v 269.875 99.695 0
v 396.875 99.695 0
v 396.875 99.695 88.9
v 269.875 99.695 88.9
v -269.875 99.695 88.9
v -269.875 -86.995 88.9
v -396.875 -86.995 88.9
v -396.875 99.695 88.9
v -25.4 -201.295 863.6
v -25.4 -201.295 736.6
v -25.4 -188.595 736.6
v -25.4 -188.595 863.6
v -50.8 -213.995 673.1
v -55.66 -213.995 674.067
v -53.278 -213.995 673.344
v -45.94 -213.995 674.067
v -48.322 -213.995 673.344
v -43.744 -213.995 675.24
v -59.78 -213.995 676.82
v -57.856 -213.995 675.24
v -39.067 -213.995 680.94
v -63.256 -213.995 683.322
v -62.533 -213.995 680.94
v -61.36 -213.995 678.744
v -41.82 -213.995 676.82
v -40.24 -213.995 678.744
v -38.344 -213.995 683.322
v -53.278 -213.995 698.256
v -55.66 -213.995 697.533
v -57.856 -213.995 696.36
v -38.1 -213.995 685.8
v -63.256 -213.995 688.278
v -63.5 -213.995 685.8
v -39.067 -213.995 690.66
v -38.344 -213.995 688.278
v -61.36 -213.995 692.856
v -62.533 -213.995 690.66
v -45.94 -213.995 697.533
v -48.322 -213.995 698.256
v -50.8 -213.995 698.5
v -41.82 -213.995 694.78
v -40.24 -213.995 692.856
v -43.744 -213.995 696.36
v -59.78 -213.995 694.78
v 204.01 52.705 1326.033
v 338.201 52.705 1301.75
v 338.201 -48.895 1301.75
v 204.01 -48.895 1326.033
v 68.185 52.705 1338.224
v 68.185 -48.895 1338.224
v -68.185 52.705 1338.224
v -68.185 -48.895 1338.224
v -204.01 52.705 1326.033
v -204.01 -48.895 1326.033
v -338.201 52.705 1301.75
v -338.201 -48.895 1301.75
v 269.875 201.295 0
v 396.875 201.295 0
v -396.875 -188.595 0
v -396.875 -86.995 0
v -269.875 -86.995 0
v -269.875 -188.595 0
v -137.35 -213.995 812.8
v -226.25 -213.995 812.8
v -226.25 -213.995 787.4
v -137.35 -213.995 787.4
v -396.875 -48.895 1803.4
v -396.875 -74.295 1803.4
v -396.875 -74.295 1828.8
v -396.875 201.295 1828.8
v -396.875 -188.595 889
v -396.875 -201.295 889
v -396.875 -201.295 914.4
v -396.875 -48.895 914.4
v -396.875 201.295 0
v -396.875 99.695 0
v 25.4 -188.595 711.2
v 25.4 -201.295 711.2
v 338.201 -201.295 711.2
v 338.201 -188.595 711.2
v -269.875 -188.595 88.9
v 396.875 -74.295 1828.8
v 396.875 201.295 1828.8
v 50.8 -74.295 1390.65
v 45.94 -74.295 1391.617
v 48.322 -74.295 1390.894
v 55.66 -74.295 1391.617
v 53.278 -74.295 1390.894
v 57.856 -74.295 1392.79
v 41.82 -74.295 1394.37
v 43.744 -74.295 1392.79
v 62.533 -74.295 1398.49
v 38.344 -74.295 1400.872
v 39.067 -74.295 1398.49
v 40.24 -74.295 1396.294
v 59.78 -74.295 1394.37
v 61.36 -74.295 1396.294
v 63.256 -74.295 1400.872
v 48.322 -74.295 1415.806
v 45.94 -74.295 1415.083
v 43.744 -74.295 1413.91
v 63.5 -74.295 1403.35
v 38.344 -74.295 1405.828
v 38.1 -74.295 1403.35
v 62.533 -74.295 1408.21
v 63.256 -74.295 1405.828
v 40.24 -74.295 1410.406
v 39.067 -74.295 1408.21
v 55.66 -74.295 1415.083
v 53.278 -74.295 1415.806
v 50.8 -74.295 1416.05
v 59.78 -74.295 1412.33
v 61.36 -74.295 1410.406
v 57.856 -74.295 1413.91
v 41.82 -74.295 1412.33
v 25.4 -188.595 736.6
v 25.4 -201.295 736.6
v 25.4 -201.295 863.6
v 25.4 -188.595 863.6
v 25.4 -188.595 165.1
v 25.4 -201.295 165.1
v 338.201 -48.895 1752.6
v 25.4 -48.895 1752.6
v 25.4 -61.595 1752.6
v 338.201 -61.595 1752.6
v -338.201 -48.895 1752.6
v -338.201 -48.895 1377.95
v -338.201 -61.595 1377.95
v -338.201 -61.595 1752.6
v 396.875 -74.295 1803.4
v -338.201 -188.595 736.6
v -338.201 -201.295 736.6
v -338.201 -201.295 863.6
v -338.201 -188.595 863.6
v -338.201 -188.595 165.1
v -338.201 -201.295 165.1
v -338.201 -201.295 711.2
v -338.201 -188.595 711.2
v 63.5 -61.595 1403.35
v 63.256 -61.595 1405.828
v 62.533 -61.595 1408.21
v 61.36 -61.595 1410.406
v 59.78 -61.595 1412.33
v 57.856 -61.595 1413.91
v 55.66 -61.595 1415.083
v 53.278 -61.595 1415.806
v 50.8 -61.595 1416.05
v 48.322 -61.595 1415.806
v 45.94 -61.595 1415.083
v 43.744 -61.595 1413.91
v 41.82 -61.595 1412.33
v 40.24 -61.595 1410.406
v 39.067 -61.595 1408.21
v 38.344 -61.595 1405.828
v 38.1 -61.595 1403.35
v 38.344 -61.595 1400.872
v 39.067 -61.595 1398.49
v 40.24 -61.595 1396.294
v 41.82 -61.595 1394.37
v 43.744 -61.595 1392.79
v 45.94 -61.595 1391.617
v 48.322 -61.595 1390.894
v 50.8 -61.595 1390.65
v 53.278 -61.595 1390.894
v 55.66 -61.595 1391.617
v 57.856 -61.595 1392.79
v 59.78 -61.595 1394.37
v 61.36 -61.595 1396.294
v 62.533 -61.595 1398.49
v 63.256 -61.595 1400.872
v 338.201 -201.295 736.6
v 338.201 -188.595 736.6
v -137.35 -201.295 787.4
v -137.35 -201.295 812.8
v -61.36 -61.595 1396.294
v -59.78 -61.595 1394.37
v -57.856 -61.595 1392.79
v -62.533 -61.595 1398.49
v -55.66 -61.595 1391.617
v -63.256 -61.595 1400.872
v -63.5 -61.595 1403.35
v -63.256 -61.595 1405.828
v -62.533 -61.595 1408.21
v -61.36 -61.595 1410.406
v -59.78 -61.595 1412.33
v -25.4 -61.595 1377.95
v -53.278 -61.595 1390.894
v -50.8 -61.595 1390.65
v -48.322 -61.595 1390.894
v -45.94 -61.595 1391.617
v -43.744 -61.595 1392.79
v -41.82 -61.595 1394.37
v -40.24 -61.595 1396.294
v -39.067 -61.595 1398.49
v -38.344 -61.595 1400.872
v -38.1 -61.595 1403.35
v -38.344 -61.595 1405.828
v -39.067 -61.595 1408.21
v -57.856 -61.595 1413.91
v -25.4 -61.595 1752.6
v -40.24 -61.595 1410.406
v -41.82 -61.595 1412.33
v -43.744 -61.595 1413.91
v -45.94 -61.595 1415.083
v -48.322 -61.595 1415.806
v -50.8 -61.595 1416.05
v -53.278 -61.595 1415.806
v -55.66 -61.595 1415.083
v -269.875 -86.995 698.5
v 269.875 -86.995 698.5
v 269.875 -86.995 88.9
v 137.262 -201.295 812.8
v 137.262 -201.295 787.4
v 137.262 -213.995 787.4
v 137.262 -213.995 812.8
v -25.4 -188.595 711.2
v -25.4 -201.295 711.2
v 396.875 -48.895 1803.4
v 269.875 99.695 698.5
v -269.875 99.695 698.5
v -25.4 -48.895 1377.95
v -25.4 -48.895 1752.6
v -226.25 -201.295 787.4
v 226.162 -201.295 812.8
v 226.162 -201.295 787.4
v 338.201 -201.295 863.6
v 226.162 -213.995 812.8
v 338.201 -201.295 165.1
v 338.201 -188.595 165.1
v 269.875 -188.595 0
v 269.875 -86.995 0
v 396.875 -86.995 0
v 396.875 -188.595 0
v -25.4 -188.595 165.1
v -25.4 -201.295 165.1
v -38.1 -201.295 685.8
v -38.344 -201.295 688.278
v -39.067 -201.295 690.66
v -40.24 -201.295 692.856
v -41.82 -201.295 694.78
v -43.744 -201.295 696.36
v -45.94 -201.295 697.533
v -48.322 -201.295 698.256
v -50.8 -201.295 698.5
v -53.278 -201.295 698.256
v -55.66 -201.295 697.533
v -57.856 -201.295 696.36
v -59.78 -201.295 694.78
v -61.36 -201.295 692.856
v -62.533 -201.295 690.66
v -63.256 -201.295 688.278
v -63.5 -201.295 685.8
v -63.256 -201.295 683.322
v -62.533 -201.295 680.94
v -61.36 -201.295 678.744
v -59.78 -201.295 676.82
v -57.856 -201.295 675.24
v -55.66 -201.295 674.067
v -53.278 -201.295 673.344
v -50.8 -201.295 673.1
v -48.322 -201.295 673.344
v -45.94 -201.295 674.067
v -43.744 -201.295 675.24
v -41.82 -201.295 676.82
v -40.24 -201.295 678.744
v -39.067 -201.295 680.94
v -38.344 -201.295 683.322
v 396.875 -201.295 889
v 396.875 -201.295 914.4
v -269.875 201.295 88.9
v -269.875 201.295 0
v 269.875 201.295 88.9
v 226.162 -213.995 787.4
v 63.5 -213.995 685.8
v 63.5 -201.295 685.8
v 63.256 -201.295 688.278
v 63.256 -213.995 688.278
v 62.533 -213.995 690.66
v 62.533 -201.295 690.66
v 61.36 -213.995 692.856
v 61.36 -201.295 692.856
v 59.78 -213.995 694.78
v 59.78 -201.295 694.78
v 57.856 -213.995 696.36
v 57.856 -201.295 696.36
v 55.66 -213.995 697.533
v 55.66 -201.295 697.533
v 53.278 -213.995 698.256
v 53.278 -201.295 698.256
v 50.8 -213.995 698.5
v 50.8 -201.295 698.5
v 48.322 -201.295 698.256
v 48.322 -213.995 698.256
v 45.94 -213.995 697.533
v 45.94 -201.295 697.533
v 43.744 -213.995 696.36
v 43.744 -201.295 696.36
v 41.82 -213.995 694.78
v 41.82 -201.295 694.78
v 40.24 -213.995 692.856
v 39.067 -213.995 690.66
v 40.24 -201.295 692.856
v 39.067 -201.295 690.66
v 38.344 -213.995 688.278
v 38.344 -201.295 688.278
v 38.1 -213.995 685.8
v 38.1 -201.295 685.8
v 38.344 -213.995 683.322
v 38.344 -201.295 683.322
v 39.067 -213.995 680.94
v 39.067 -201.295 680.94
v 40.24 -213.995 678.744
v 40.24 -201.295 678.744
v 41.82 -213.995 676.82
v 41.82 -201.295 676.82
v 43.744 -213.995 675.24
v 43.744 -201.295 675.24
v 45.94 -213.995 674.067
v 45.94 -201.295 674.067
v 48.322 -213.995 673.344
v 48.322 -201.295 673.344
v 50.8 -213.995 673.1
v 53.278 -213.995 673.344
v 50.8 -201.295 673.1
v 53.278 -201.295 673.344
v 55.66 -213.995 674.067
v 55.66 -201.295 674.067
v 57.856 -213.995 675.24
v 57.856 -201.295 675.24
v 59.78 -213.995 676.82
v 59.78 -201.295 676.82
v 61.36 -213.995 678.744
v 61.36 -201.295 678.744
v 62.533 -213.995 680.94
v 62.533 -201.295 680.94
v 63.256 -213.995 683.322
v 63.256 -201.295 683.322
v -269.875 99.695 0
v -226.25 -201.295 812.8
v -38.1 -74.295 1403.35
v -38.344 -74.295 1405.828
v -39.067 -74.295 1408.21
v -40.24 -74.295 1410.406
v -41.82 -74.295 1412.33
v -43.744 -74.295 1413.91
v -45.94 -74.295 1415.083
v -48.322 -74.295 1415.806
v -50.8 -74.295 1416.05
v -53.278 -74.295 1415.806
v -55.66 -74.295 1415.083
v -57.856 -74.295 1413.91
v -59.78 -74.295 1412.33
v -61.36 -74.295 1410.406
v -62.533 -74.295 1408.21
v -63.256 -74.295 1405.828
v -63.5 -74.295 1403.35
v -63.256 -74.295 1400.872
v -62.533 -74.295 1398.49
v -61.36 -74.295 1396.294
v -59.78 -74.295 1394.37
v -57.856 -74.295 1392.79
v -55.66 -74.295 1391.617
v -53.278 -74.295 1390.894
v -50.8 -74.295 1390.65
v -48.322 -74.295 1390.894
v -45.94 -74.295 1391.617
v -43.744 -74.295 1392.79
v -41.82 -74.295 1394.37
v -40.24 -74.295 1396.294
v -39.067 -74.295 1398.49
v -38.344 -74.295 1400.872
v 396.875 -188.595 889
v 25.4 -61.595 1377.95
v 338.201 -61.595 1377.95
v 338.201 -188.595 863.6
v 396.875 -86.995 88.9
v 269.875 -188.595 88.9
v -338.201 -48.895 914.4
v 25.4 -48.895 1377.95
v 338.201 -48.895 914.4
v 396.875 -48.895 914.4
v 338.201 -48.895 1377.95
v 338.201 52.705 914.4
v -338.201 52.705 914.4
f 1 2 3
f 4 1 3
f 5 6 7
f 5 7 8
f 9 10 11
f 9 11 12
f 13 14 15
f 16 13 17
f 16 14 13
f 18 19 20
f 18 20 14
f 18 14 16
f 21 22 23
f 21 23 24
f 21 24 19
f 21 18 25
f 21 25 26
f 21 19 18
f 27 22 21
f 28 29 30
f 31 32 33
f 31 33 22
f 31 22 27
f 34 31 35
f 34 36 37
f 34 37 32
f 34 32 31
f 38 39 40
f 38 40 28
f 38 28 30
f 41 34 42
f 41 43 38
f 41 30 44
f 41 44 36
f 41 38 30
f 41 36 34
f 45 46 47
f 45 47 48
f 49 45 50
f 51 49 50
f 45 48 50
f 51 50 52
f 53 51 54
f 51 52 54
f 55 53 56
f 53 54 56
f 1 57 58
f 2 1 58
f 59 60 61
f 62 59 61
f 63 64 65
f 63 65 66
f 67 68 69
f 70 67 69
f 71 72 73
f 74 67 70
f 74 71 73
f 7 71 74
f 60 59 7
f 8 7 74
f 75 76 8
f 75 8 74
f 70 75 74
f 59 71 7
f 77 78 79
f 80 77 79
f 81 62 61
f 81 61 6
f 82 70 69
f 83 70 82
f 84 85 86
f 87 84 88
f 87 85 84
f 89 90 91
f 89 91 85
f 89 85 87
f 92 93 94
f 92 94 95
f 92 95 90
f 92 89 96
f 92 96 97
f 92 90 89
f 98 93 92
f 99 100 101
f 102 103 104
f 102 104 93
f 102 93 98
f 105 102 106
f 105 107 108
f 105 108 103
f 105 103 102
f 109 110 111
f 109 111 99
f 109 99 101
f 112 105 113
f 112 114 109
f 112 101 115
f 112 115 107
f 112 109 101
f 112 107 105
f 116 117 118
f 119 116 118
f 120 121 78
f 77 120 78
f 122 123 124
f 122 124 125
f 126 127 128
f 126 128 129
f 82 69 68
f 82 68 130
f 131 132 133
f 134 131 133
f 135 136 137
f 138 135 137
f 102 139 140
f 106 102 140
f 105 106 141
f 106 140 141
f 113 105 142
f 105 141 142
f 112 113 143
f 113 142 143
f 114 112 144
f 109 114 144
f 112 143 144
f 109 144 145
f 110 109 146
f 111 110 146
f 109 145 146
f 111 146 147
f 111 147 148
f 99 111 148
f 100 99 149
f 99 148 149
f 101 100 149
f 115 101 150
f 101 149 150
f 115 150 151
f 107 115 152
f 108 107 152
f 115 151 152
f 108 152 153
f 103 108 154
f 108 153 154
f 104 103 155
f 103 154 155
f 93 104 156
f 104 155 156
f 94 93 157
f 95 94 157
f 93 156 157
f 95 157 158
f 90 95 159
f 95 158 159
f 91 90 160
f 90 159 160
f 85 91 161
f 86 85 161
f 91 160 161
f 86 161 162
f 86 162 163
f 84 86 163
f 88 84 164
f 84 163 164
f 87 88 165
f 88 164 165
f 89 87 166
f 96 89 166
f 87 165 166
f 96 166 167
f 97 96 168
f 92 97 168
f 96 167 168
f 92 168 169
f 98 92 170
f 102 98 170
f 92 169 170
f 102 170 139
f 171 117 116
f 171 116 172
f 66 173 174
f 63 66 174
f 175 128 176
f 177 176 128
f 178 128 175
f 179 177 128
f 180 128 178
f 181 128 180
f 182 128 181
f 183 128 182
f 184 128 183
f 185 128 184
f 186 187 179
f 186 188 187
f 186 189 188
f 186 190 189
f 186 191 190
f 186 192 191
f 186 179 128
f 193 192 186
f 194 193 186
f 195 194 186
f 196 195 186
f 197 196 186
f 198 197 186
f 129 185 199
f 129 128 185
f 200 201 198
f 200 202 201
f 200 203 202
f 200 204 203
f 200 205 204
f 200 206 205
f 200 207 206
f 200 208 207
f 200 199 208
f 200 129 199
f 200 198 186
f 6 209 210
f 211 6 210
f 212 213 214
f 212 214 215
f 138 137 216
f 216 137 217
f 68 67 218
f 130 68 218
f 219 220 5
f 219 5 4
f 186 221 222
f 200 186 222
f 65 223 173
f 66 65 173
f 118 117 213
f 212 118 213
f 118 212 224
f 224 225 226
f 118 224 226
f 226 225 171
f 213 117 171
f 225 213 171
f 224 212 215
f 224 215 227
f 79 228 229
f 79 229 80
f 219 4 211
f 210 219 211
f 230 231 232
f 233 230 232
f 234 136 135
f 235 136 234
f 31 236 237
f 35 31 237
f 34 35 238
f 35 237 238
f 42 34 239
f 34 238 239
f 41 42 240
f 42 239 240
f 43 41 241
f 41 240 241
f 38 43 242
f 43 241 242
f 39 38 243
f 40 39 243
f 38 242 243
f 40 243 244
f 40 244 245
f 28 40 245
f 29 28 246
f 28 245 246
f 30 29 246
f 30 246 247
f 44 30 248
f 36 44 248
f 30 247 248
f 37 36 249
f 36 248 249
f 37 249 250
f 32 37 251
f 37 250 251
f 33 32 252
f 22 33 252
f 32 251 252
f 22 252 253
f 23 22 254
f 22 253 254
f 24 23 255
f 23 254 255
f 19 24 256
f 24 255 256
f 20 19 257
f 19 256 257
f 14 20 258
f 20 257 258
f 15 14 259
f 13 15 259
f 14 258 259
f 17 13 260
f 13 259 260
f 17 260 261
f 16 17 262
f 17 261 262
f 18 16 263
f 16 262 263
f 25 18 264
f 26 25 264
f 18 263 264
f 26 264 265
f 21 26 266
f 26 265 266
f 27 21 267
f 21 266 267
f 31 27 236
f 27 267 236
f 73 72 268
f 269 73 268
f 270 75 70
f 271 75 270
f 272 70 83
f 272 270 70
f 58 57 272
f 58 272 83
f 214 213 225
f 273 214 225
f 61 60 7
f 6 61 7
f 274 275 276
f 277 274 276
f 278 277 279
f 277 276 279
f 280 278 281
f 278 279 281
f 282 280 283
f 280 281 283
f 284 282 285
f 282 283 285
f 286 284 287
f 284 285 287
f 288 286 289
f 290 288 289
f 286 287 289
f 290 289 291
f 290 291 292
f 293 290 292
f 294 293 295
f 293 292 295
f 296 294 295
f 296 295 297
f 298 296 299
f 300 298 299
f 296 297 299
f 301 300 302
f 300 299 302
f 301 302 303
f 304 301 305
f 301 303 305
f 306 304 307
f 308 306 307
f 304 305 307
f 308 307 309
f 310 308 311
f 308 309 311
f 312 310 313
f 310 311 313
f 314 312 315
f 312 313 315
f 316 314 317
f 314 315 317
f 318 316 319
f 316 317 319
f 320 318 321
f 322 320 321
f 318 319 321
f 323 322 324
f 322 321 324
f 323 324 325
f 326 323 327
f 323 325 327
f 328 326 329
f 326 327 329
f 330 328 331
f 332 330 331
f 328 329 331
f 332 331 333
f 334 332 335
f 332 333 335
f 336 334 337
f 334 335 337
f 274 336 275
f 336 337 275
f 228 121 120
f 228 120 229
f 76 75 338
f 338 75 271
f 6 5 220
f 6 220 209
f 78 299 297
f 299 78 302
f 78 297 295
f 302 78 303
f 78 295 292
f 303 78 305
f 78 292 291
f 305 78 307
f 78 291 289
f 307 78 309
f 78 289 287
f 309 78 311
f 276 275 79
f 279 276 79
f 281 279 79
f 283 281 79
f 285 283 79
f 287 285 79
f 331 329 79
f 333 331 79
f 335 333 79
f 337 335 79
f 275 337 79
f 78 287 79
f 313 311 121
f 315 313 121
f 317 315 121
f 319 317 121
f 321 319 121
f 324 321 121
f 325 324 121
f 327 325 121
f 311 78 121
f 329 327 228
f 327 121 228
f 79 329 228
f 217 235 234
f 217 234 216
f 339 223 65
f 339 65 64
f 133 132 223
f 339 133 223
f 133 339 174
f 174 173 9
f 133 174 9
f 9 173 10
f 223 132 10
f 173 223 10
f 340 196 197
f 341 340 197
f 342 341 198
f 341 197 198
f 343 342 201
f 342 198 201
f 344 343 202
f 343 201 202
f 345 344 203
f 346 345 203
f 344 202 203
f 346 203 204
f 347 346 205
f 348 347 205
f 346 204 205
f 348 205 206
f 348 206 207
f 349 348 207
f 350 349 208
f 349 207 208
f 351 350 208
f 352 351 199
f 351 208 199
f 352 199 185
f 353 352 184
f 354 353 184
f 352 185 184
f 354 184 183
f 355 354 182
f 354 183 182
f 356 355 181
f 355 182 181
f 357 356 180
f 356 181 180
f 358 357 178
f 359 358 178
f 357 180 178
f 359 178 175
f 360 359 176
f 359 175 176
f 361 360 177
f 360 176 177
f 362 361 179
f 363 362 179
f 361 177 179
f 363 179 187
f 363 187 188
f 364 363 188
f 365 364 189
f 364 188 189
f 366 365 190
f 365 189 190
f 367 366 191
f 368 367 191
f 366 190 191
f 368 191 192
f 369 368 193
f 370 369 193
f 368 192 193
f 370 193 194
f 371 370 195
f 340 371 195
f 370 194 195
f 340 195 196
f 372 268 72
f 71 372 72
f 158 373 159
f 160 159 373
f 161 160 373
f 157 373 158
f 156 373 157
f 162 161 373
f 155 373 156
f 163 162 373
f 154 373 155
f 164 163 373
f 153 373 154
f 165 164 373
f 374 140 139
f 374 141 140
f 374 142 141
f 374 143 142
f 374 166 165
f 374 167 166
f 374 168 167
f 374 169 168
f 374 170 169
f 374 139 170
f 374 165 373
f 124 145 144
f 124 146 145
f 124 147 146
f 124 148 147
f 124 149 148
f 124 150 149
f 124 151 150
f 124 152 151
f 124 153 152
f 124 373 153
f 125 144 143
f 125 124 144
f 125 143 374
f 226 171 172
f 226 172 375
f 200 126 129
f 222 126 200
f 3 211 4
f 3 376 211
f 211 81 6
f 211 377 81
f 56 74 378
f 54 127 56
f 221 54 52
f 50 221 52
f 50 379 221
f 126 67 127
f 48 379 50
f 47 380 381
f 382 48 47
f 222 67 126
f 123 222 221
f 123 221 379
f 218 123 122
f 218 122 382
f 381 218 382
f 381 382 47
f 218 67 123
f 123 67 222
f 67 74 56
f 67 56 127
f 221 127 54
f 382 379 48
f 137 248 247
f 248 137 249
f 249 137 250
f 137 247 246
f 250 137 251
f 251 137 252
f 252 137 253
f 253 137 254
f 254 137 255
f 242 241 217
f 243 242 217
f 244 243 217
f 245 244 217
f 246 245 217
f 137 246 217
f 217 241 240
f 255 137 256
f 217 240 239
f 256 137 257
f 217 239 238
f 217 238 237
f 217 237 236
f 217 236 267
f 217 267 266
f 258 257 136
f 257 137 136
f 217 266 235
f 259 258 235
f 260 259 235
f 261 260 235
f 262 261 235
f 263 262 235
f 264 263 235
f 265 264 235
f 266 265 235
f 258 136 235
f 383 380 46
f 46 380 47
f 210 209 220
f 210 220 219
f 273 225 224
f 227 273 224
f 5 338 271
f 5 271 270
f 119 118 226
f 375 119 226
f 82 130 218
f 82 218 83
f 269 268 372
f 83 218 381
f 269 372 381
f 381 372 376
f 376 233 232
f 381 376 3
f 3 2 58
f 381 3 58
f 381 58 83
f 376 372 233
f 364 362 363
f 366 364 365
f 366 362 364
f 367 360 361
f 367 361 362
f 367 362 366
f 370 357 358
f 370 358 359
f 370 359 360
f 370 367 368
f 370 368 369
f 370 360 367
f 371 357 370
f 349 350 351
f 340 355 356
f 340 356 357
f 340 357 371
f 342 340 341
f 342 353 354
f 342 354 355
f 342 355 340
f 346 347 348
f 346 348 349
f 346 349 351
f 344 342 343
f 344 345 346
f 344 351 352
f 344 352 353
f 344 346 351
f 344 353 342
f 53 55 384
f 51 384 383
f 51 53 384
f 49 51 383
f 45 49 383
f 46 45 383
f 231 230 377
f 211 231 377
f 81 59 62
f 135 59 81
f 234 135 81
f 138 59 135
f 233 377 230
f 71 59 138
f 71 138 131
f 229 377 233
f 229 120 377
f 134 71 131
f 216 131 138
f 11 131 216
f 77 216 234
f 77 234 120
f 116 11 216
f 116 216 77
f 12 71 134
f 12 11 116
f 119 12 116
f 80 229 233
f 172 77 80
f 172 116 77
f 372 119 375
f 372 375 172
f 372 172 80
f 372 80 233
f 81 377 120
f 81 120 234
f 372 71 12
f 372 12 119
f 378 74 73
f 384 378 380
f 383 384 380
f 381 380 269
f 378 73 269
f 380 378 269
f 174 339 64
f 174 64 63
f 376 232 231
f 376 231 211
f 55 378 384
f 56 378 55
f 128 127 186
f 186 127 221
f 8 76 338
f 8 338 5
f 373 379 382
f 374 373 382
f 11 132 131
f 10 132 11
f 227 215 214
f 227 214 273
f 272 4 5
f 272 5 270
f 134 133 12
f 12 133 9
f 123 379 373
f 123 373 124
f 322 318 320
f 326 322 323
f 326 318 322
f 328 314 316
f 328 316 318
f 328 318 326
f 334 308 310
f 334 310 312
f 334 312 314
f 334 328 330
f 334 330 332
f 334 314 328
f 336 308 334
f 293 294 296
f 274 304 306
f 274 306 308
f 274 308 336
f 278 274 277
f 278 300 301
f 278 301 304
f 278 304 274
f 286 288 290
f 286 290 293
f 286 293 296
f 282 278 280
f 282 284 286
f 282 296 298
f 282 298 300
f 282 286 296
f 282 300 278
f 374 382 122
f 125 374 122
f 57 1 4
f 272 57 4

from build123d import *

# Parameters (mm, degrees)
F0_W      = 793.75
F0_H      = 402.59
F1_DEPTH  = 1828.8
F2_W      = 539.75
F2_H      = 88.9
F3_DEPTH  = 402.591
F2_W_2    = 312.801
F2_H_2    = 546.1
F2_H_3    = 127
F4_DEPTH  = 12.7
F2_H_4    = 374.65
F2_W_3    = 676.402
F2_H_5    = 387.35
F5_DEPTH  = 152.4
F6_DEPTH  = 254
F7_W      = 312.801
F7_H      = 374.65
F8_DEPTH  = 12.7
F9_W      = 186.69
F9_H      = 88.9
F10_DEPTH = 793.751
F11_W     = 88.9
F11_H     = 25.4
F11_R     = 12.7
F12_DEPTH = 12.7
F13_R     = 12.7
F14_DEPTH = 12.7
F15_W     = 793.75
F15_H     = 250.19
F15_H_2   = 25.4
F16_DEPTH = 25.4
F17_W     = 539.75
F17_H     = 186.69
F18_DEPTH = 609.6


with BuildPart() as f1:
    # F0 (on Top) → F1 (new body)
    with BuildSketch(Plane.XY):
        Rectangle(F0_W, F0_H)
    extrude(amount=F1_DEPTH)

    # F2 (on face) → F3 (cut, through all)
    with BuildSketch(Plane.XZ.offset(201.295)):
        with Locations((0, 44.45)):
            Rectangle(F2_W, F2_H)
    extrude(amount=-F3_DEPTH, mode=Mode.SUBTRACT)

    # F2 (on face) → F4 (cut)
    with BuildSketch(Plane.XZ.offset(201.295)):
        Polygon((-396.875, 0), (-269.875, 0), (-269.875, 88.9), (269.875, 88.9), (269.875, 0), (396.875, 0), (396.875, 889), (-396.875, 889), align=None)
        with Locations((-181.8005, 438.15)):
            Rectangle(F2_W_2, F2_H_2, mode=Mode.SUBTRACT)
        with Locations((-181.8005, 800.1)):
            Rectangle(F2_W_2, F2_H_3, mode=Mode.SUBTRACT)
        with Locations((181.8005, 438.15)):
            Rectangle(F2_W_2, F2_H_2, mode=Mode.SUBTRACT)
        with Locations((181.8005, 800.1)):
            Rectangle(F2_W_2, F2_H_3, mode=Mode.SUBTRACT)
    extrude(amount=-F4_DEPTH, mode=Mode.SUBTRACT)

    # F2 (on face) → F5 (cut)
    with BuildSketch(Plane.XZ.offset(201.295)):
        with BuildLine():
            Line((-396.875, 1828.8), (-396.875, 914.4))
            Line((-396.875, 914.4), (-338.201, 914.4))
            Line((-338.201, 914.4), (-338.201, 1301.75))
            ThreePointArc((-338.201, 1301.75), (0, 1339.749972), (338.201, 1301.75))
            Line((338.201, 1301.75), (338.201, 914.4))
            Line((338.201, 914.4), (396.875, 914.4))
            Line((396.875, 914.4), (396.875, 1828.8))
            Line((396.875, 1828.8), (-396.875, 1828.8))
        make_face()
        with Locations((-181.8005, 1565.275)):
            Rectangle(F2_W_2, F2_H_4, mode=Mode.SUBTRACT)
        with Locations((181.8005, 1565.275)):
            Rectangle(F2_W_2, F2_H_4, mode=Mode.SUBTRACT)
        with Locations((-181.8005, 1565.275)):
            Rectangle(F2_W_2, F2_H_4)
        with Locations((181.8005, 1565.275)):
            Rectangle(F2_W_2, F2_H_4)
        with Locations((0, 1108.075)):
            Rectangle(F2_W_3, F2_H_5)
    extrude(amount=-F5_DEPTH, mode=Mode.SUBTRACT)

    # F2 (on face) → F6 (cut)
    with BuildSketch(Plane.XZ.offset(201.295)):
        with Locations((0, 1108.075)):
            Rectangle(F2_W_3, F2_H_5)
        with BuildLine():
            ThreePointArc((338.201, 1301.75), (0, 1339.749972), (-338.201, 1301.75))
            Line((-338.201, 1301.75), (338.201, 1301.75))
        make_face()
    extrude(amount=-F6_DEPTH, mode=Mode.SUBTRACT)

    # F7 (on face) → F8 (join)
    with BuildSketch(Plane.XZ.offset(48.895)):
        with Locations((181.8005, 1565.275)):
            Rectangle(F7_W, F7_H)
        with Locations((-181.8005, 1565.275)):
            Rectangle(F7_W, F7_H)
    extrude(amount=F8_DEPTH)

    # F9 (on face) → F10 (cut, through all)
    with BuildSketch(Plane.YZ.offset(396.875)):
        with Locations((6.35, 44.45)):
            Rectangle(F9_W, F9_H)
    extrude(amount=-F10_DEPTH, mode=Mode.SUBTRACT)

    # F11 (on face) → F12 (join)
    with BuildSketch(Plane.XZ.offset(201.295)):
        with Locations((181.7116, 800.1)):
            Rectangle(F11_W, F11_H)
        with Locations((50.8, 685.8)):
            Circle(F11_R)
        with Locations((-50.8, 685.8)):
            Circle(F11_R)
        with Locations((-181.8005, 800.1)):
            Rectangle(F11_W, F11_H)
    extrude(amount=F12_DEPTH)

    # F13 (on face) → F14 (join)
    with BuildSketch(Plane.XZ.offset(61.595)):
        with Locations((-50.8, 1403.35)):
            Circle(F13_R)
        with Locations((50.8, 1403.35)):
            Circle(F13_R)
    extrude(amount=F14_DEPTH)

    # F15 (on face) → F16 (join)
    with BuildSketch(Plane.XY.offset(1828.8)):
        with Locations((0, 76.2)):
            Rectangle(F15_W, F15_H)
        with Locations((0, -61.595)):
            Rectangle(F15_W, F15_H_2)
    extrude(amount=-F16_DEPTH)

    # F17 (on face) → F18 (cut)
    with BuildSketch(Plane(origin=(0, 0, 88.9), x_dir=(1, 0, 0), z_dir=(0, 0, -1))):
        with Locations((0, -6.35)):
            Rectangle(F17_W, F17_H)
    extrude(amount=-F18_DEPTH, mode=Mode.SUBTRACT)


solid = f1.part
